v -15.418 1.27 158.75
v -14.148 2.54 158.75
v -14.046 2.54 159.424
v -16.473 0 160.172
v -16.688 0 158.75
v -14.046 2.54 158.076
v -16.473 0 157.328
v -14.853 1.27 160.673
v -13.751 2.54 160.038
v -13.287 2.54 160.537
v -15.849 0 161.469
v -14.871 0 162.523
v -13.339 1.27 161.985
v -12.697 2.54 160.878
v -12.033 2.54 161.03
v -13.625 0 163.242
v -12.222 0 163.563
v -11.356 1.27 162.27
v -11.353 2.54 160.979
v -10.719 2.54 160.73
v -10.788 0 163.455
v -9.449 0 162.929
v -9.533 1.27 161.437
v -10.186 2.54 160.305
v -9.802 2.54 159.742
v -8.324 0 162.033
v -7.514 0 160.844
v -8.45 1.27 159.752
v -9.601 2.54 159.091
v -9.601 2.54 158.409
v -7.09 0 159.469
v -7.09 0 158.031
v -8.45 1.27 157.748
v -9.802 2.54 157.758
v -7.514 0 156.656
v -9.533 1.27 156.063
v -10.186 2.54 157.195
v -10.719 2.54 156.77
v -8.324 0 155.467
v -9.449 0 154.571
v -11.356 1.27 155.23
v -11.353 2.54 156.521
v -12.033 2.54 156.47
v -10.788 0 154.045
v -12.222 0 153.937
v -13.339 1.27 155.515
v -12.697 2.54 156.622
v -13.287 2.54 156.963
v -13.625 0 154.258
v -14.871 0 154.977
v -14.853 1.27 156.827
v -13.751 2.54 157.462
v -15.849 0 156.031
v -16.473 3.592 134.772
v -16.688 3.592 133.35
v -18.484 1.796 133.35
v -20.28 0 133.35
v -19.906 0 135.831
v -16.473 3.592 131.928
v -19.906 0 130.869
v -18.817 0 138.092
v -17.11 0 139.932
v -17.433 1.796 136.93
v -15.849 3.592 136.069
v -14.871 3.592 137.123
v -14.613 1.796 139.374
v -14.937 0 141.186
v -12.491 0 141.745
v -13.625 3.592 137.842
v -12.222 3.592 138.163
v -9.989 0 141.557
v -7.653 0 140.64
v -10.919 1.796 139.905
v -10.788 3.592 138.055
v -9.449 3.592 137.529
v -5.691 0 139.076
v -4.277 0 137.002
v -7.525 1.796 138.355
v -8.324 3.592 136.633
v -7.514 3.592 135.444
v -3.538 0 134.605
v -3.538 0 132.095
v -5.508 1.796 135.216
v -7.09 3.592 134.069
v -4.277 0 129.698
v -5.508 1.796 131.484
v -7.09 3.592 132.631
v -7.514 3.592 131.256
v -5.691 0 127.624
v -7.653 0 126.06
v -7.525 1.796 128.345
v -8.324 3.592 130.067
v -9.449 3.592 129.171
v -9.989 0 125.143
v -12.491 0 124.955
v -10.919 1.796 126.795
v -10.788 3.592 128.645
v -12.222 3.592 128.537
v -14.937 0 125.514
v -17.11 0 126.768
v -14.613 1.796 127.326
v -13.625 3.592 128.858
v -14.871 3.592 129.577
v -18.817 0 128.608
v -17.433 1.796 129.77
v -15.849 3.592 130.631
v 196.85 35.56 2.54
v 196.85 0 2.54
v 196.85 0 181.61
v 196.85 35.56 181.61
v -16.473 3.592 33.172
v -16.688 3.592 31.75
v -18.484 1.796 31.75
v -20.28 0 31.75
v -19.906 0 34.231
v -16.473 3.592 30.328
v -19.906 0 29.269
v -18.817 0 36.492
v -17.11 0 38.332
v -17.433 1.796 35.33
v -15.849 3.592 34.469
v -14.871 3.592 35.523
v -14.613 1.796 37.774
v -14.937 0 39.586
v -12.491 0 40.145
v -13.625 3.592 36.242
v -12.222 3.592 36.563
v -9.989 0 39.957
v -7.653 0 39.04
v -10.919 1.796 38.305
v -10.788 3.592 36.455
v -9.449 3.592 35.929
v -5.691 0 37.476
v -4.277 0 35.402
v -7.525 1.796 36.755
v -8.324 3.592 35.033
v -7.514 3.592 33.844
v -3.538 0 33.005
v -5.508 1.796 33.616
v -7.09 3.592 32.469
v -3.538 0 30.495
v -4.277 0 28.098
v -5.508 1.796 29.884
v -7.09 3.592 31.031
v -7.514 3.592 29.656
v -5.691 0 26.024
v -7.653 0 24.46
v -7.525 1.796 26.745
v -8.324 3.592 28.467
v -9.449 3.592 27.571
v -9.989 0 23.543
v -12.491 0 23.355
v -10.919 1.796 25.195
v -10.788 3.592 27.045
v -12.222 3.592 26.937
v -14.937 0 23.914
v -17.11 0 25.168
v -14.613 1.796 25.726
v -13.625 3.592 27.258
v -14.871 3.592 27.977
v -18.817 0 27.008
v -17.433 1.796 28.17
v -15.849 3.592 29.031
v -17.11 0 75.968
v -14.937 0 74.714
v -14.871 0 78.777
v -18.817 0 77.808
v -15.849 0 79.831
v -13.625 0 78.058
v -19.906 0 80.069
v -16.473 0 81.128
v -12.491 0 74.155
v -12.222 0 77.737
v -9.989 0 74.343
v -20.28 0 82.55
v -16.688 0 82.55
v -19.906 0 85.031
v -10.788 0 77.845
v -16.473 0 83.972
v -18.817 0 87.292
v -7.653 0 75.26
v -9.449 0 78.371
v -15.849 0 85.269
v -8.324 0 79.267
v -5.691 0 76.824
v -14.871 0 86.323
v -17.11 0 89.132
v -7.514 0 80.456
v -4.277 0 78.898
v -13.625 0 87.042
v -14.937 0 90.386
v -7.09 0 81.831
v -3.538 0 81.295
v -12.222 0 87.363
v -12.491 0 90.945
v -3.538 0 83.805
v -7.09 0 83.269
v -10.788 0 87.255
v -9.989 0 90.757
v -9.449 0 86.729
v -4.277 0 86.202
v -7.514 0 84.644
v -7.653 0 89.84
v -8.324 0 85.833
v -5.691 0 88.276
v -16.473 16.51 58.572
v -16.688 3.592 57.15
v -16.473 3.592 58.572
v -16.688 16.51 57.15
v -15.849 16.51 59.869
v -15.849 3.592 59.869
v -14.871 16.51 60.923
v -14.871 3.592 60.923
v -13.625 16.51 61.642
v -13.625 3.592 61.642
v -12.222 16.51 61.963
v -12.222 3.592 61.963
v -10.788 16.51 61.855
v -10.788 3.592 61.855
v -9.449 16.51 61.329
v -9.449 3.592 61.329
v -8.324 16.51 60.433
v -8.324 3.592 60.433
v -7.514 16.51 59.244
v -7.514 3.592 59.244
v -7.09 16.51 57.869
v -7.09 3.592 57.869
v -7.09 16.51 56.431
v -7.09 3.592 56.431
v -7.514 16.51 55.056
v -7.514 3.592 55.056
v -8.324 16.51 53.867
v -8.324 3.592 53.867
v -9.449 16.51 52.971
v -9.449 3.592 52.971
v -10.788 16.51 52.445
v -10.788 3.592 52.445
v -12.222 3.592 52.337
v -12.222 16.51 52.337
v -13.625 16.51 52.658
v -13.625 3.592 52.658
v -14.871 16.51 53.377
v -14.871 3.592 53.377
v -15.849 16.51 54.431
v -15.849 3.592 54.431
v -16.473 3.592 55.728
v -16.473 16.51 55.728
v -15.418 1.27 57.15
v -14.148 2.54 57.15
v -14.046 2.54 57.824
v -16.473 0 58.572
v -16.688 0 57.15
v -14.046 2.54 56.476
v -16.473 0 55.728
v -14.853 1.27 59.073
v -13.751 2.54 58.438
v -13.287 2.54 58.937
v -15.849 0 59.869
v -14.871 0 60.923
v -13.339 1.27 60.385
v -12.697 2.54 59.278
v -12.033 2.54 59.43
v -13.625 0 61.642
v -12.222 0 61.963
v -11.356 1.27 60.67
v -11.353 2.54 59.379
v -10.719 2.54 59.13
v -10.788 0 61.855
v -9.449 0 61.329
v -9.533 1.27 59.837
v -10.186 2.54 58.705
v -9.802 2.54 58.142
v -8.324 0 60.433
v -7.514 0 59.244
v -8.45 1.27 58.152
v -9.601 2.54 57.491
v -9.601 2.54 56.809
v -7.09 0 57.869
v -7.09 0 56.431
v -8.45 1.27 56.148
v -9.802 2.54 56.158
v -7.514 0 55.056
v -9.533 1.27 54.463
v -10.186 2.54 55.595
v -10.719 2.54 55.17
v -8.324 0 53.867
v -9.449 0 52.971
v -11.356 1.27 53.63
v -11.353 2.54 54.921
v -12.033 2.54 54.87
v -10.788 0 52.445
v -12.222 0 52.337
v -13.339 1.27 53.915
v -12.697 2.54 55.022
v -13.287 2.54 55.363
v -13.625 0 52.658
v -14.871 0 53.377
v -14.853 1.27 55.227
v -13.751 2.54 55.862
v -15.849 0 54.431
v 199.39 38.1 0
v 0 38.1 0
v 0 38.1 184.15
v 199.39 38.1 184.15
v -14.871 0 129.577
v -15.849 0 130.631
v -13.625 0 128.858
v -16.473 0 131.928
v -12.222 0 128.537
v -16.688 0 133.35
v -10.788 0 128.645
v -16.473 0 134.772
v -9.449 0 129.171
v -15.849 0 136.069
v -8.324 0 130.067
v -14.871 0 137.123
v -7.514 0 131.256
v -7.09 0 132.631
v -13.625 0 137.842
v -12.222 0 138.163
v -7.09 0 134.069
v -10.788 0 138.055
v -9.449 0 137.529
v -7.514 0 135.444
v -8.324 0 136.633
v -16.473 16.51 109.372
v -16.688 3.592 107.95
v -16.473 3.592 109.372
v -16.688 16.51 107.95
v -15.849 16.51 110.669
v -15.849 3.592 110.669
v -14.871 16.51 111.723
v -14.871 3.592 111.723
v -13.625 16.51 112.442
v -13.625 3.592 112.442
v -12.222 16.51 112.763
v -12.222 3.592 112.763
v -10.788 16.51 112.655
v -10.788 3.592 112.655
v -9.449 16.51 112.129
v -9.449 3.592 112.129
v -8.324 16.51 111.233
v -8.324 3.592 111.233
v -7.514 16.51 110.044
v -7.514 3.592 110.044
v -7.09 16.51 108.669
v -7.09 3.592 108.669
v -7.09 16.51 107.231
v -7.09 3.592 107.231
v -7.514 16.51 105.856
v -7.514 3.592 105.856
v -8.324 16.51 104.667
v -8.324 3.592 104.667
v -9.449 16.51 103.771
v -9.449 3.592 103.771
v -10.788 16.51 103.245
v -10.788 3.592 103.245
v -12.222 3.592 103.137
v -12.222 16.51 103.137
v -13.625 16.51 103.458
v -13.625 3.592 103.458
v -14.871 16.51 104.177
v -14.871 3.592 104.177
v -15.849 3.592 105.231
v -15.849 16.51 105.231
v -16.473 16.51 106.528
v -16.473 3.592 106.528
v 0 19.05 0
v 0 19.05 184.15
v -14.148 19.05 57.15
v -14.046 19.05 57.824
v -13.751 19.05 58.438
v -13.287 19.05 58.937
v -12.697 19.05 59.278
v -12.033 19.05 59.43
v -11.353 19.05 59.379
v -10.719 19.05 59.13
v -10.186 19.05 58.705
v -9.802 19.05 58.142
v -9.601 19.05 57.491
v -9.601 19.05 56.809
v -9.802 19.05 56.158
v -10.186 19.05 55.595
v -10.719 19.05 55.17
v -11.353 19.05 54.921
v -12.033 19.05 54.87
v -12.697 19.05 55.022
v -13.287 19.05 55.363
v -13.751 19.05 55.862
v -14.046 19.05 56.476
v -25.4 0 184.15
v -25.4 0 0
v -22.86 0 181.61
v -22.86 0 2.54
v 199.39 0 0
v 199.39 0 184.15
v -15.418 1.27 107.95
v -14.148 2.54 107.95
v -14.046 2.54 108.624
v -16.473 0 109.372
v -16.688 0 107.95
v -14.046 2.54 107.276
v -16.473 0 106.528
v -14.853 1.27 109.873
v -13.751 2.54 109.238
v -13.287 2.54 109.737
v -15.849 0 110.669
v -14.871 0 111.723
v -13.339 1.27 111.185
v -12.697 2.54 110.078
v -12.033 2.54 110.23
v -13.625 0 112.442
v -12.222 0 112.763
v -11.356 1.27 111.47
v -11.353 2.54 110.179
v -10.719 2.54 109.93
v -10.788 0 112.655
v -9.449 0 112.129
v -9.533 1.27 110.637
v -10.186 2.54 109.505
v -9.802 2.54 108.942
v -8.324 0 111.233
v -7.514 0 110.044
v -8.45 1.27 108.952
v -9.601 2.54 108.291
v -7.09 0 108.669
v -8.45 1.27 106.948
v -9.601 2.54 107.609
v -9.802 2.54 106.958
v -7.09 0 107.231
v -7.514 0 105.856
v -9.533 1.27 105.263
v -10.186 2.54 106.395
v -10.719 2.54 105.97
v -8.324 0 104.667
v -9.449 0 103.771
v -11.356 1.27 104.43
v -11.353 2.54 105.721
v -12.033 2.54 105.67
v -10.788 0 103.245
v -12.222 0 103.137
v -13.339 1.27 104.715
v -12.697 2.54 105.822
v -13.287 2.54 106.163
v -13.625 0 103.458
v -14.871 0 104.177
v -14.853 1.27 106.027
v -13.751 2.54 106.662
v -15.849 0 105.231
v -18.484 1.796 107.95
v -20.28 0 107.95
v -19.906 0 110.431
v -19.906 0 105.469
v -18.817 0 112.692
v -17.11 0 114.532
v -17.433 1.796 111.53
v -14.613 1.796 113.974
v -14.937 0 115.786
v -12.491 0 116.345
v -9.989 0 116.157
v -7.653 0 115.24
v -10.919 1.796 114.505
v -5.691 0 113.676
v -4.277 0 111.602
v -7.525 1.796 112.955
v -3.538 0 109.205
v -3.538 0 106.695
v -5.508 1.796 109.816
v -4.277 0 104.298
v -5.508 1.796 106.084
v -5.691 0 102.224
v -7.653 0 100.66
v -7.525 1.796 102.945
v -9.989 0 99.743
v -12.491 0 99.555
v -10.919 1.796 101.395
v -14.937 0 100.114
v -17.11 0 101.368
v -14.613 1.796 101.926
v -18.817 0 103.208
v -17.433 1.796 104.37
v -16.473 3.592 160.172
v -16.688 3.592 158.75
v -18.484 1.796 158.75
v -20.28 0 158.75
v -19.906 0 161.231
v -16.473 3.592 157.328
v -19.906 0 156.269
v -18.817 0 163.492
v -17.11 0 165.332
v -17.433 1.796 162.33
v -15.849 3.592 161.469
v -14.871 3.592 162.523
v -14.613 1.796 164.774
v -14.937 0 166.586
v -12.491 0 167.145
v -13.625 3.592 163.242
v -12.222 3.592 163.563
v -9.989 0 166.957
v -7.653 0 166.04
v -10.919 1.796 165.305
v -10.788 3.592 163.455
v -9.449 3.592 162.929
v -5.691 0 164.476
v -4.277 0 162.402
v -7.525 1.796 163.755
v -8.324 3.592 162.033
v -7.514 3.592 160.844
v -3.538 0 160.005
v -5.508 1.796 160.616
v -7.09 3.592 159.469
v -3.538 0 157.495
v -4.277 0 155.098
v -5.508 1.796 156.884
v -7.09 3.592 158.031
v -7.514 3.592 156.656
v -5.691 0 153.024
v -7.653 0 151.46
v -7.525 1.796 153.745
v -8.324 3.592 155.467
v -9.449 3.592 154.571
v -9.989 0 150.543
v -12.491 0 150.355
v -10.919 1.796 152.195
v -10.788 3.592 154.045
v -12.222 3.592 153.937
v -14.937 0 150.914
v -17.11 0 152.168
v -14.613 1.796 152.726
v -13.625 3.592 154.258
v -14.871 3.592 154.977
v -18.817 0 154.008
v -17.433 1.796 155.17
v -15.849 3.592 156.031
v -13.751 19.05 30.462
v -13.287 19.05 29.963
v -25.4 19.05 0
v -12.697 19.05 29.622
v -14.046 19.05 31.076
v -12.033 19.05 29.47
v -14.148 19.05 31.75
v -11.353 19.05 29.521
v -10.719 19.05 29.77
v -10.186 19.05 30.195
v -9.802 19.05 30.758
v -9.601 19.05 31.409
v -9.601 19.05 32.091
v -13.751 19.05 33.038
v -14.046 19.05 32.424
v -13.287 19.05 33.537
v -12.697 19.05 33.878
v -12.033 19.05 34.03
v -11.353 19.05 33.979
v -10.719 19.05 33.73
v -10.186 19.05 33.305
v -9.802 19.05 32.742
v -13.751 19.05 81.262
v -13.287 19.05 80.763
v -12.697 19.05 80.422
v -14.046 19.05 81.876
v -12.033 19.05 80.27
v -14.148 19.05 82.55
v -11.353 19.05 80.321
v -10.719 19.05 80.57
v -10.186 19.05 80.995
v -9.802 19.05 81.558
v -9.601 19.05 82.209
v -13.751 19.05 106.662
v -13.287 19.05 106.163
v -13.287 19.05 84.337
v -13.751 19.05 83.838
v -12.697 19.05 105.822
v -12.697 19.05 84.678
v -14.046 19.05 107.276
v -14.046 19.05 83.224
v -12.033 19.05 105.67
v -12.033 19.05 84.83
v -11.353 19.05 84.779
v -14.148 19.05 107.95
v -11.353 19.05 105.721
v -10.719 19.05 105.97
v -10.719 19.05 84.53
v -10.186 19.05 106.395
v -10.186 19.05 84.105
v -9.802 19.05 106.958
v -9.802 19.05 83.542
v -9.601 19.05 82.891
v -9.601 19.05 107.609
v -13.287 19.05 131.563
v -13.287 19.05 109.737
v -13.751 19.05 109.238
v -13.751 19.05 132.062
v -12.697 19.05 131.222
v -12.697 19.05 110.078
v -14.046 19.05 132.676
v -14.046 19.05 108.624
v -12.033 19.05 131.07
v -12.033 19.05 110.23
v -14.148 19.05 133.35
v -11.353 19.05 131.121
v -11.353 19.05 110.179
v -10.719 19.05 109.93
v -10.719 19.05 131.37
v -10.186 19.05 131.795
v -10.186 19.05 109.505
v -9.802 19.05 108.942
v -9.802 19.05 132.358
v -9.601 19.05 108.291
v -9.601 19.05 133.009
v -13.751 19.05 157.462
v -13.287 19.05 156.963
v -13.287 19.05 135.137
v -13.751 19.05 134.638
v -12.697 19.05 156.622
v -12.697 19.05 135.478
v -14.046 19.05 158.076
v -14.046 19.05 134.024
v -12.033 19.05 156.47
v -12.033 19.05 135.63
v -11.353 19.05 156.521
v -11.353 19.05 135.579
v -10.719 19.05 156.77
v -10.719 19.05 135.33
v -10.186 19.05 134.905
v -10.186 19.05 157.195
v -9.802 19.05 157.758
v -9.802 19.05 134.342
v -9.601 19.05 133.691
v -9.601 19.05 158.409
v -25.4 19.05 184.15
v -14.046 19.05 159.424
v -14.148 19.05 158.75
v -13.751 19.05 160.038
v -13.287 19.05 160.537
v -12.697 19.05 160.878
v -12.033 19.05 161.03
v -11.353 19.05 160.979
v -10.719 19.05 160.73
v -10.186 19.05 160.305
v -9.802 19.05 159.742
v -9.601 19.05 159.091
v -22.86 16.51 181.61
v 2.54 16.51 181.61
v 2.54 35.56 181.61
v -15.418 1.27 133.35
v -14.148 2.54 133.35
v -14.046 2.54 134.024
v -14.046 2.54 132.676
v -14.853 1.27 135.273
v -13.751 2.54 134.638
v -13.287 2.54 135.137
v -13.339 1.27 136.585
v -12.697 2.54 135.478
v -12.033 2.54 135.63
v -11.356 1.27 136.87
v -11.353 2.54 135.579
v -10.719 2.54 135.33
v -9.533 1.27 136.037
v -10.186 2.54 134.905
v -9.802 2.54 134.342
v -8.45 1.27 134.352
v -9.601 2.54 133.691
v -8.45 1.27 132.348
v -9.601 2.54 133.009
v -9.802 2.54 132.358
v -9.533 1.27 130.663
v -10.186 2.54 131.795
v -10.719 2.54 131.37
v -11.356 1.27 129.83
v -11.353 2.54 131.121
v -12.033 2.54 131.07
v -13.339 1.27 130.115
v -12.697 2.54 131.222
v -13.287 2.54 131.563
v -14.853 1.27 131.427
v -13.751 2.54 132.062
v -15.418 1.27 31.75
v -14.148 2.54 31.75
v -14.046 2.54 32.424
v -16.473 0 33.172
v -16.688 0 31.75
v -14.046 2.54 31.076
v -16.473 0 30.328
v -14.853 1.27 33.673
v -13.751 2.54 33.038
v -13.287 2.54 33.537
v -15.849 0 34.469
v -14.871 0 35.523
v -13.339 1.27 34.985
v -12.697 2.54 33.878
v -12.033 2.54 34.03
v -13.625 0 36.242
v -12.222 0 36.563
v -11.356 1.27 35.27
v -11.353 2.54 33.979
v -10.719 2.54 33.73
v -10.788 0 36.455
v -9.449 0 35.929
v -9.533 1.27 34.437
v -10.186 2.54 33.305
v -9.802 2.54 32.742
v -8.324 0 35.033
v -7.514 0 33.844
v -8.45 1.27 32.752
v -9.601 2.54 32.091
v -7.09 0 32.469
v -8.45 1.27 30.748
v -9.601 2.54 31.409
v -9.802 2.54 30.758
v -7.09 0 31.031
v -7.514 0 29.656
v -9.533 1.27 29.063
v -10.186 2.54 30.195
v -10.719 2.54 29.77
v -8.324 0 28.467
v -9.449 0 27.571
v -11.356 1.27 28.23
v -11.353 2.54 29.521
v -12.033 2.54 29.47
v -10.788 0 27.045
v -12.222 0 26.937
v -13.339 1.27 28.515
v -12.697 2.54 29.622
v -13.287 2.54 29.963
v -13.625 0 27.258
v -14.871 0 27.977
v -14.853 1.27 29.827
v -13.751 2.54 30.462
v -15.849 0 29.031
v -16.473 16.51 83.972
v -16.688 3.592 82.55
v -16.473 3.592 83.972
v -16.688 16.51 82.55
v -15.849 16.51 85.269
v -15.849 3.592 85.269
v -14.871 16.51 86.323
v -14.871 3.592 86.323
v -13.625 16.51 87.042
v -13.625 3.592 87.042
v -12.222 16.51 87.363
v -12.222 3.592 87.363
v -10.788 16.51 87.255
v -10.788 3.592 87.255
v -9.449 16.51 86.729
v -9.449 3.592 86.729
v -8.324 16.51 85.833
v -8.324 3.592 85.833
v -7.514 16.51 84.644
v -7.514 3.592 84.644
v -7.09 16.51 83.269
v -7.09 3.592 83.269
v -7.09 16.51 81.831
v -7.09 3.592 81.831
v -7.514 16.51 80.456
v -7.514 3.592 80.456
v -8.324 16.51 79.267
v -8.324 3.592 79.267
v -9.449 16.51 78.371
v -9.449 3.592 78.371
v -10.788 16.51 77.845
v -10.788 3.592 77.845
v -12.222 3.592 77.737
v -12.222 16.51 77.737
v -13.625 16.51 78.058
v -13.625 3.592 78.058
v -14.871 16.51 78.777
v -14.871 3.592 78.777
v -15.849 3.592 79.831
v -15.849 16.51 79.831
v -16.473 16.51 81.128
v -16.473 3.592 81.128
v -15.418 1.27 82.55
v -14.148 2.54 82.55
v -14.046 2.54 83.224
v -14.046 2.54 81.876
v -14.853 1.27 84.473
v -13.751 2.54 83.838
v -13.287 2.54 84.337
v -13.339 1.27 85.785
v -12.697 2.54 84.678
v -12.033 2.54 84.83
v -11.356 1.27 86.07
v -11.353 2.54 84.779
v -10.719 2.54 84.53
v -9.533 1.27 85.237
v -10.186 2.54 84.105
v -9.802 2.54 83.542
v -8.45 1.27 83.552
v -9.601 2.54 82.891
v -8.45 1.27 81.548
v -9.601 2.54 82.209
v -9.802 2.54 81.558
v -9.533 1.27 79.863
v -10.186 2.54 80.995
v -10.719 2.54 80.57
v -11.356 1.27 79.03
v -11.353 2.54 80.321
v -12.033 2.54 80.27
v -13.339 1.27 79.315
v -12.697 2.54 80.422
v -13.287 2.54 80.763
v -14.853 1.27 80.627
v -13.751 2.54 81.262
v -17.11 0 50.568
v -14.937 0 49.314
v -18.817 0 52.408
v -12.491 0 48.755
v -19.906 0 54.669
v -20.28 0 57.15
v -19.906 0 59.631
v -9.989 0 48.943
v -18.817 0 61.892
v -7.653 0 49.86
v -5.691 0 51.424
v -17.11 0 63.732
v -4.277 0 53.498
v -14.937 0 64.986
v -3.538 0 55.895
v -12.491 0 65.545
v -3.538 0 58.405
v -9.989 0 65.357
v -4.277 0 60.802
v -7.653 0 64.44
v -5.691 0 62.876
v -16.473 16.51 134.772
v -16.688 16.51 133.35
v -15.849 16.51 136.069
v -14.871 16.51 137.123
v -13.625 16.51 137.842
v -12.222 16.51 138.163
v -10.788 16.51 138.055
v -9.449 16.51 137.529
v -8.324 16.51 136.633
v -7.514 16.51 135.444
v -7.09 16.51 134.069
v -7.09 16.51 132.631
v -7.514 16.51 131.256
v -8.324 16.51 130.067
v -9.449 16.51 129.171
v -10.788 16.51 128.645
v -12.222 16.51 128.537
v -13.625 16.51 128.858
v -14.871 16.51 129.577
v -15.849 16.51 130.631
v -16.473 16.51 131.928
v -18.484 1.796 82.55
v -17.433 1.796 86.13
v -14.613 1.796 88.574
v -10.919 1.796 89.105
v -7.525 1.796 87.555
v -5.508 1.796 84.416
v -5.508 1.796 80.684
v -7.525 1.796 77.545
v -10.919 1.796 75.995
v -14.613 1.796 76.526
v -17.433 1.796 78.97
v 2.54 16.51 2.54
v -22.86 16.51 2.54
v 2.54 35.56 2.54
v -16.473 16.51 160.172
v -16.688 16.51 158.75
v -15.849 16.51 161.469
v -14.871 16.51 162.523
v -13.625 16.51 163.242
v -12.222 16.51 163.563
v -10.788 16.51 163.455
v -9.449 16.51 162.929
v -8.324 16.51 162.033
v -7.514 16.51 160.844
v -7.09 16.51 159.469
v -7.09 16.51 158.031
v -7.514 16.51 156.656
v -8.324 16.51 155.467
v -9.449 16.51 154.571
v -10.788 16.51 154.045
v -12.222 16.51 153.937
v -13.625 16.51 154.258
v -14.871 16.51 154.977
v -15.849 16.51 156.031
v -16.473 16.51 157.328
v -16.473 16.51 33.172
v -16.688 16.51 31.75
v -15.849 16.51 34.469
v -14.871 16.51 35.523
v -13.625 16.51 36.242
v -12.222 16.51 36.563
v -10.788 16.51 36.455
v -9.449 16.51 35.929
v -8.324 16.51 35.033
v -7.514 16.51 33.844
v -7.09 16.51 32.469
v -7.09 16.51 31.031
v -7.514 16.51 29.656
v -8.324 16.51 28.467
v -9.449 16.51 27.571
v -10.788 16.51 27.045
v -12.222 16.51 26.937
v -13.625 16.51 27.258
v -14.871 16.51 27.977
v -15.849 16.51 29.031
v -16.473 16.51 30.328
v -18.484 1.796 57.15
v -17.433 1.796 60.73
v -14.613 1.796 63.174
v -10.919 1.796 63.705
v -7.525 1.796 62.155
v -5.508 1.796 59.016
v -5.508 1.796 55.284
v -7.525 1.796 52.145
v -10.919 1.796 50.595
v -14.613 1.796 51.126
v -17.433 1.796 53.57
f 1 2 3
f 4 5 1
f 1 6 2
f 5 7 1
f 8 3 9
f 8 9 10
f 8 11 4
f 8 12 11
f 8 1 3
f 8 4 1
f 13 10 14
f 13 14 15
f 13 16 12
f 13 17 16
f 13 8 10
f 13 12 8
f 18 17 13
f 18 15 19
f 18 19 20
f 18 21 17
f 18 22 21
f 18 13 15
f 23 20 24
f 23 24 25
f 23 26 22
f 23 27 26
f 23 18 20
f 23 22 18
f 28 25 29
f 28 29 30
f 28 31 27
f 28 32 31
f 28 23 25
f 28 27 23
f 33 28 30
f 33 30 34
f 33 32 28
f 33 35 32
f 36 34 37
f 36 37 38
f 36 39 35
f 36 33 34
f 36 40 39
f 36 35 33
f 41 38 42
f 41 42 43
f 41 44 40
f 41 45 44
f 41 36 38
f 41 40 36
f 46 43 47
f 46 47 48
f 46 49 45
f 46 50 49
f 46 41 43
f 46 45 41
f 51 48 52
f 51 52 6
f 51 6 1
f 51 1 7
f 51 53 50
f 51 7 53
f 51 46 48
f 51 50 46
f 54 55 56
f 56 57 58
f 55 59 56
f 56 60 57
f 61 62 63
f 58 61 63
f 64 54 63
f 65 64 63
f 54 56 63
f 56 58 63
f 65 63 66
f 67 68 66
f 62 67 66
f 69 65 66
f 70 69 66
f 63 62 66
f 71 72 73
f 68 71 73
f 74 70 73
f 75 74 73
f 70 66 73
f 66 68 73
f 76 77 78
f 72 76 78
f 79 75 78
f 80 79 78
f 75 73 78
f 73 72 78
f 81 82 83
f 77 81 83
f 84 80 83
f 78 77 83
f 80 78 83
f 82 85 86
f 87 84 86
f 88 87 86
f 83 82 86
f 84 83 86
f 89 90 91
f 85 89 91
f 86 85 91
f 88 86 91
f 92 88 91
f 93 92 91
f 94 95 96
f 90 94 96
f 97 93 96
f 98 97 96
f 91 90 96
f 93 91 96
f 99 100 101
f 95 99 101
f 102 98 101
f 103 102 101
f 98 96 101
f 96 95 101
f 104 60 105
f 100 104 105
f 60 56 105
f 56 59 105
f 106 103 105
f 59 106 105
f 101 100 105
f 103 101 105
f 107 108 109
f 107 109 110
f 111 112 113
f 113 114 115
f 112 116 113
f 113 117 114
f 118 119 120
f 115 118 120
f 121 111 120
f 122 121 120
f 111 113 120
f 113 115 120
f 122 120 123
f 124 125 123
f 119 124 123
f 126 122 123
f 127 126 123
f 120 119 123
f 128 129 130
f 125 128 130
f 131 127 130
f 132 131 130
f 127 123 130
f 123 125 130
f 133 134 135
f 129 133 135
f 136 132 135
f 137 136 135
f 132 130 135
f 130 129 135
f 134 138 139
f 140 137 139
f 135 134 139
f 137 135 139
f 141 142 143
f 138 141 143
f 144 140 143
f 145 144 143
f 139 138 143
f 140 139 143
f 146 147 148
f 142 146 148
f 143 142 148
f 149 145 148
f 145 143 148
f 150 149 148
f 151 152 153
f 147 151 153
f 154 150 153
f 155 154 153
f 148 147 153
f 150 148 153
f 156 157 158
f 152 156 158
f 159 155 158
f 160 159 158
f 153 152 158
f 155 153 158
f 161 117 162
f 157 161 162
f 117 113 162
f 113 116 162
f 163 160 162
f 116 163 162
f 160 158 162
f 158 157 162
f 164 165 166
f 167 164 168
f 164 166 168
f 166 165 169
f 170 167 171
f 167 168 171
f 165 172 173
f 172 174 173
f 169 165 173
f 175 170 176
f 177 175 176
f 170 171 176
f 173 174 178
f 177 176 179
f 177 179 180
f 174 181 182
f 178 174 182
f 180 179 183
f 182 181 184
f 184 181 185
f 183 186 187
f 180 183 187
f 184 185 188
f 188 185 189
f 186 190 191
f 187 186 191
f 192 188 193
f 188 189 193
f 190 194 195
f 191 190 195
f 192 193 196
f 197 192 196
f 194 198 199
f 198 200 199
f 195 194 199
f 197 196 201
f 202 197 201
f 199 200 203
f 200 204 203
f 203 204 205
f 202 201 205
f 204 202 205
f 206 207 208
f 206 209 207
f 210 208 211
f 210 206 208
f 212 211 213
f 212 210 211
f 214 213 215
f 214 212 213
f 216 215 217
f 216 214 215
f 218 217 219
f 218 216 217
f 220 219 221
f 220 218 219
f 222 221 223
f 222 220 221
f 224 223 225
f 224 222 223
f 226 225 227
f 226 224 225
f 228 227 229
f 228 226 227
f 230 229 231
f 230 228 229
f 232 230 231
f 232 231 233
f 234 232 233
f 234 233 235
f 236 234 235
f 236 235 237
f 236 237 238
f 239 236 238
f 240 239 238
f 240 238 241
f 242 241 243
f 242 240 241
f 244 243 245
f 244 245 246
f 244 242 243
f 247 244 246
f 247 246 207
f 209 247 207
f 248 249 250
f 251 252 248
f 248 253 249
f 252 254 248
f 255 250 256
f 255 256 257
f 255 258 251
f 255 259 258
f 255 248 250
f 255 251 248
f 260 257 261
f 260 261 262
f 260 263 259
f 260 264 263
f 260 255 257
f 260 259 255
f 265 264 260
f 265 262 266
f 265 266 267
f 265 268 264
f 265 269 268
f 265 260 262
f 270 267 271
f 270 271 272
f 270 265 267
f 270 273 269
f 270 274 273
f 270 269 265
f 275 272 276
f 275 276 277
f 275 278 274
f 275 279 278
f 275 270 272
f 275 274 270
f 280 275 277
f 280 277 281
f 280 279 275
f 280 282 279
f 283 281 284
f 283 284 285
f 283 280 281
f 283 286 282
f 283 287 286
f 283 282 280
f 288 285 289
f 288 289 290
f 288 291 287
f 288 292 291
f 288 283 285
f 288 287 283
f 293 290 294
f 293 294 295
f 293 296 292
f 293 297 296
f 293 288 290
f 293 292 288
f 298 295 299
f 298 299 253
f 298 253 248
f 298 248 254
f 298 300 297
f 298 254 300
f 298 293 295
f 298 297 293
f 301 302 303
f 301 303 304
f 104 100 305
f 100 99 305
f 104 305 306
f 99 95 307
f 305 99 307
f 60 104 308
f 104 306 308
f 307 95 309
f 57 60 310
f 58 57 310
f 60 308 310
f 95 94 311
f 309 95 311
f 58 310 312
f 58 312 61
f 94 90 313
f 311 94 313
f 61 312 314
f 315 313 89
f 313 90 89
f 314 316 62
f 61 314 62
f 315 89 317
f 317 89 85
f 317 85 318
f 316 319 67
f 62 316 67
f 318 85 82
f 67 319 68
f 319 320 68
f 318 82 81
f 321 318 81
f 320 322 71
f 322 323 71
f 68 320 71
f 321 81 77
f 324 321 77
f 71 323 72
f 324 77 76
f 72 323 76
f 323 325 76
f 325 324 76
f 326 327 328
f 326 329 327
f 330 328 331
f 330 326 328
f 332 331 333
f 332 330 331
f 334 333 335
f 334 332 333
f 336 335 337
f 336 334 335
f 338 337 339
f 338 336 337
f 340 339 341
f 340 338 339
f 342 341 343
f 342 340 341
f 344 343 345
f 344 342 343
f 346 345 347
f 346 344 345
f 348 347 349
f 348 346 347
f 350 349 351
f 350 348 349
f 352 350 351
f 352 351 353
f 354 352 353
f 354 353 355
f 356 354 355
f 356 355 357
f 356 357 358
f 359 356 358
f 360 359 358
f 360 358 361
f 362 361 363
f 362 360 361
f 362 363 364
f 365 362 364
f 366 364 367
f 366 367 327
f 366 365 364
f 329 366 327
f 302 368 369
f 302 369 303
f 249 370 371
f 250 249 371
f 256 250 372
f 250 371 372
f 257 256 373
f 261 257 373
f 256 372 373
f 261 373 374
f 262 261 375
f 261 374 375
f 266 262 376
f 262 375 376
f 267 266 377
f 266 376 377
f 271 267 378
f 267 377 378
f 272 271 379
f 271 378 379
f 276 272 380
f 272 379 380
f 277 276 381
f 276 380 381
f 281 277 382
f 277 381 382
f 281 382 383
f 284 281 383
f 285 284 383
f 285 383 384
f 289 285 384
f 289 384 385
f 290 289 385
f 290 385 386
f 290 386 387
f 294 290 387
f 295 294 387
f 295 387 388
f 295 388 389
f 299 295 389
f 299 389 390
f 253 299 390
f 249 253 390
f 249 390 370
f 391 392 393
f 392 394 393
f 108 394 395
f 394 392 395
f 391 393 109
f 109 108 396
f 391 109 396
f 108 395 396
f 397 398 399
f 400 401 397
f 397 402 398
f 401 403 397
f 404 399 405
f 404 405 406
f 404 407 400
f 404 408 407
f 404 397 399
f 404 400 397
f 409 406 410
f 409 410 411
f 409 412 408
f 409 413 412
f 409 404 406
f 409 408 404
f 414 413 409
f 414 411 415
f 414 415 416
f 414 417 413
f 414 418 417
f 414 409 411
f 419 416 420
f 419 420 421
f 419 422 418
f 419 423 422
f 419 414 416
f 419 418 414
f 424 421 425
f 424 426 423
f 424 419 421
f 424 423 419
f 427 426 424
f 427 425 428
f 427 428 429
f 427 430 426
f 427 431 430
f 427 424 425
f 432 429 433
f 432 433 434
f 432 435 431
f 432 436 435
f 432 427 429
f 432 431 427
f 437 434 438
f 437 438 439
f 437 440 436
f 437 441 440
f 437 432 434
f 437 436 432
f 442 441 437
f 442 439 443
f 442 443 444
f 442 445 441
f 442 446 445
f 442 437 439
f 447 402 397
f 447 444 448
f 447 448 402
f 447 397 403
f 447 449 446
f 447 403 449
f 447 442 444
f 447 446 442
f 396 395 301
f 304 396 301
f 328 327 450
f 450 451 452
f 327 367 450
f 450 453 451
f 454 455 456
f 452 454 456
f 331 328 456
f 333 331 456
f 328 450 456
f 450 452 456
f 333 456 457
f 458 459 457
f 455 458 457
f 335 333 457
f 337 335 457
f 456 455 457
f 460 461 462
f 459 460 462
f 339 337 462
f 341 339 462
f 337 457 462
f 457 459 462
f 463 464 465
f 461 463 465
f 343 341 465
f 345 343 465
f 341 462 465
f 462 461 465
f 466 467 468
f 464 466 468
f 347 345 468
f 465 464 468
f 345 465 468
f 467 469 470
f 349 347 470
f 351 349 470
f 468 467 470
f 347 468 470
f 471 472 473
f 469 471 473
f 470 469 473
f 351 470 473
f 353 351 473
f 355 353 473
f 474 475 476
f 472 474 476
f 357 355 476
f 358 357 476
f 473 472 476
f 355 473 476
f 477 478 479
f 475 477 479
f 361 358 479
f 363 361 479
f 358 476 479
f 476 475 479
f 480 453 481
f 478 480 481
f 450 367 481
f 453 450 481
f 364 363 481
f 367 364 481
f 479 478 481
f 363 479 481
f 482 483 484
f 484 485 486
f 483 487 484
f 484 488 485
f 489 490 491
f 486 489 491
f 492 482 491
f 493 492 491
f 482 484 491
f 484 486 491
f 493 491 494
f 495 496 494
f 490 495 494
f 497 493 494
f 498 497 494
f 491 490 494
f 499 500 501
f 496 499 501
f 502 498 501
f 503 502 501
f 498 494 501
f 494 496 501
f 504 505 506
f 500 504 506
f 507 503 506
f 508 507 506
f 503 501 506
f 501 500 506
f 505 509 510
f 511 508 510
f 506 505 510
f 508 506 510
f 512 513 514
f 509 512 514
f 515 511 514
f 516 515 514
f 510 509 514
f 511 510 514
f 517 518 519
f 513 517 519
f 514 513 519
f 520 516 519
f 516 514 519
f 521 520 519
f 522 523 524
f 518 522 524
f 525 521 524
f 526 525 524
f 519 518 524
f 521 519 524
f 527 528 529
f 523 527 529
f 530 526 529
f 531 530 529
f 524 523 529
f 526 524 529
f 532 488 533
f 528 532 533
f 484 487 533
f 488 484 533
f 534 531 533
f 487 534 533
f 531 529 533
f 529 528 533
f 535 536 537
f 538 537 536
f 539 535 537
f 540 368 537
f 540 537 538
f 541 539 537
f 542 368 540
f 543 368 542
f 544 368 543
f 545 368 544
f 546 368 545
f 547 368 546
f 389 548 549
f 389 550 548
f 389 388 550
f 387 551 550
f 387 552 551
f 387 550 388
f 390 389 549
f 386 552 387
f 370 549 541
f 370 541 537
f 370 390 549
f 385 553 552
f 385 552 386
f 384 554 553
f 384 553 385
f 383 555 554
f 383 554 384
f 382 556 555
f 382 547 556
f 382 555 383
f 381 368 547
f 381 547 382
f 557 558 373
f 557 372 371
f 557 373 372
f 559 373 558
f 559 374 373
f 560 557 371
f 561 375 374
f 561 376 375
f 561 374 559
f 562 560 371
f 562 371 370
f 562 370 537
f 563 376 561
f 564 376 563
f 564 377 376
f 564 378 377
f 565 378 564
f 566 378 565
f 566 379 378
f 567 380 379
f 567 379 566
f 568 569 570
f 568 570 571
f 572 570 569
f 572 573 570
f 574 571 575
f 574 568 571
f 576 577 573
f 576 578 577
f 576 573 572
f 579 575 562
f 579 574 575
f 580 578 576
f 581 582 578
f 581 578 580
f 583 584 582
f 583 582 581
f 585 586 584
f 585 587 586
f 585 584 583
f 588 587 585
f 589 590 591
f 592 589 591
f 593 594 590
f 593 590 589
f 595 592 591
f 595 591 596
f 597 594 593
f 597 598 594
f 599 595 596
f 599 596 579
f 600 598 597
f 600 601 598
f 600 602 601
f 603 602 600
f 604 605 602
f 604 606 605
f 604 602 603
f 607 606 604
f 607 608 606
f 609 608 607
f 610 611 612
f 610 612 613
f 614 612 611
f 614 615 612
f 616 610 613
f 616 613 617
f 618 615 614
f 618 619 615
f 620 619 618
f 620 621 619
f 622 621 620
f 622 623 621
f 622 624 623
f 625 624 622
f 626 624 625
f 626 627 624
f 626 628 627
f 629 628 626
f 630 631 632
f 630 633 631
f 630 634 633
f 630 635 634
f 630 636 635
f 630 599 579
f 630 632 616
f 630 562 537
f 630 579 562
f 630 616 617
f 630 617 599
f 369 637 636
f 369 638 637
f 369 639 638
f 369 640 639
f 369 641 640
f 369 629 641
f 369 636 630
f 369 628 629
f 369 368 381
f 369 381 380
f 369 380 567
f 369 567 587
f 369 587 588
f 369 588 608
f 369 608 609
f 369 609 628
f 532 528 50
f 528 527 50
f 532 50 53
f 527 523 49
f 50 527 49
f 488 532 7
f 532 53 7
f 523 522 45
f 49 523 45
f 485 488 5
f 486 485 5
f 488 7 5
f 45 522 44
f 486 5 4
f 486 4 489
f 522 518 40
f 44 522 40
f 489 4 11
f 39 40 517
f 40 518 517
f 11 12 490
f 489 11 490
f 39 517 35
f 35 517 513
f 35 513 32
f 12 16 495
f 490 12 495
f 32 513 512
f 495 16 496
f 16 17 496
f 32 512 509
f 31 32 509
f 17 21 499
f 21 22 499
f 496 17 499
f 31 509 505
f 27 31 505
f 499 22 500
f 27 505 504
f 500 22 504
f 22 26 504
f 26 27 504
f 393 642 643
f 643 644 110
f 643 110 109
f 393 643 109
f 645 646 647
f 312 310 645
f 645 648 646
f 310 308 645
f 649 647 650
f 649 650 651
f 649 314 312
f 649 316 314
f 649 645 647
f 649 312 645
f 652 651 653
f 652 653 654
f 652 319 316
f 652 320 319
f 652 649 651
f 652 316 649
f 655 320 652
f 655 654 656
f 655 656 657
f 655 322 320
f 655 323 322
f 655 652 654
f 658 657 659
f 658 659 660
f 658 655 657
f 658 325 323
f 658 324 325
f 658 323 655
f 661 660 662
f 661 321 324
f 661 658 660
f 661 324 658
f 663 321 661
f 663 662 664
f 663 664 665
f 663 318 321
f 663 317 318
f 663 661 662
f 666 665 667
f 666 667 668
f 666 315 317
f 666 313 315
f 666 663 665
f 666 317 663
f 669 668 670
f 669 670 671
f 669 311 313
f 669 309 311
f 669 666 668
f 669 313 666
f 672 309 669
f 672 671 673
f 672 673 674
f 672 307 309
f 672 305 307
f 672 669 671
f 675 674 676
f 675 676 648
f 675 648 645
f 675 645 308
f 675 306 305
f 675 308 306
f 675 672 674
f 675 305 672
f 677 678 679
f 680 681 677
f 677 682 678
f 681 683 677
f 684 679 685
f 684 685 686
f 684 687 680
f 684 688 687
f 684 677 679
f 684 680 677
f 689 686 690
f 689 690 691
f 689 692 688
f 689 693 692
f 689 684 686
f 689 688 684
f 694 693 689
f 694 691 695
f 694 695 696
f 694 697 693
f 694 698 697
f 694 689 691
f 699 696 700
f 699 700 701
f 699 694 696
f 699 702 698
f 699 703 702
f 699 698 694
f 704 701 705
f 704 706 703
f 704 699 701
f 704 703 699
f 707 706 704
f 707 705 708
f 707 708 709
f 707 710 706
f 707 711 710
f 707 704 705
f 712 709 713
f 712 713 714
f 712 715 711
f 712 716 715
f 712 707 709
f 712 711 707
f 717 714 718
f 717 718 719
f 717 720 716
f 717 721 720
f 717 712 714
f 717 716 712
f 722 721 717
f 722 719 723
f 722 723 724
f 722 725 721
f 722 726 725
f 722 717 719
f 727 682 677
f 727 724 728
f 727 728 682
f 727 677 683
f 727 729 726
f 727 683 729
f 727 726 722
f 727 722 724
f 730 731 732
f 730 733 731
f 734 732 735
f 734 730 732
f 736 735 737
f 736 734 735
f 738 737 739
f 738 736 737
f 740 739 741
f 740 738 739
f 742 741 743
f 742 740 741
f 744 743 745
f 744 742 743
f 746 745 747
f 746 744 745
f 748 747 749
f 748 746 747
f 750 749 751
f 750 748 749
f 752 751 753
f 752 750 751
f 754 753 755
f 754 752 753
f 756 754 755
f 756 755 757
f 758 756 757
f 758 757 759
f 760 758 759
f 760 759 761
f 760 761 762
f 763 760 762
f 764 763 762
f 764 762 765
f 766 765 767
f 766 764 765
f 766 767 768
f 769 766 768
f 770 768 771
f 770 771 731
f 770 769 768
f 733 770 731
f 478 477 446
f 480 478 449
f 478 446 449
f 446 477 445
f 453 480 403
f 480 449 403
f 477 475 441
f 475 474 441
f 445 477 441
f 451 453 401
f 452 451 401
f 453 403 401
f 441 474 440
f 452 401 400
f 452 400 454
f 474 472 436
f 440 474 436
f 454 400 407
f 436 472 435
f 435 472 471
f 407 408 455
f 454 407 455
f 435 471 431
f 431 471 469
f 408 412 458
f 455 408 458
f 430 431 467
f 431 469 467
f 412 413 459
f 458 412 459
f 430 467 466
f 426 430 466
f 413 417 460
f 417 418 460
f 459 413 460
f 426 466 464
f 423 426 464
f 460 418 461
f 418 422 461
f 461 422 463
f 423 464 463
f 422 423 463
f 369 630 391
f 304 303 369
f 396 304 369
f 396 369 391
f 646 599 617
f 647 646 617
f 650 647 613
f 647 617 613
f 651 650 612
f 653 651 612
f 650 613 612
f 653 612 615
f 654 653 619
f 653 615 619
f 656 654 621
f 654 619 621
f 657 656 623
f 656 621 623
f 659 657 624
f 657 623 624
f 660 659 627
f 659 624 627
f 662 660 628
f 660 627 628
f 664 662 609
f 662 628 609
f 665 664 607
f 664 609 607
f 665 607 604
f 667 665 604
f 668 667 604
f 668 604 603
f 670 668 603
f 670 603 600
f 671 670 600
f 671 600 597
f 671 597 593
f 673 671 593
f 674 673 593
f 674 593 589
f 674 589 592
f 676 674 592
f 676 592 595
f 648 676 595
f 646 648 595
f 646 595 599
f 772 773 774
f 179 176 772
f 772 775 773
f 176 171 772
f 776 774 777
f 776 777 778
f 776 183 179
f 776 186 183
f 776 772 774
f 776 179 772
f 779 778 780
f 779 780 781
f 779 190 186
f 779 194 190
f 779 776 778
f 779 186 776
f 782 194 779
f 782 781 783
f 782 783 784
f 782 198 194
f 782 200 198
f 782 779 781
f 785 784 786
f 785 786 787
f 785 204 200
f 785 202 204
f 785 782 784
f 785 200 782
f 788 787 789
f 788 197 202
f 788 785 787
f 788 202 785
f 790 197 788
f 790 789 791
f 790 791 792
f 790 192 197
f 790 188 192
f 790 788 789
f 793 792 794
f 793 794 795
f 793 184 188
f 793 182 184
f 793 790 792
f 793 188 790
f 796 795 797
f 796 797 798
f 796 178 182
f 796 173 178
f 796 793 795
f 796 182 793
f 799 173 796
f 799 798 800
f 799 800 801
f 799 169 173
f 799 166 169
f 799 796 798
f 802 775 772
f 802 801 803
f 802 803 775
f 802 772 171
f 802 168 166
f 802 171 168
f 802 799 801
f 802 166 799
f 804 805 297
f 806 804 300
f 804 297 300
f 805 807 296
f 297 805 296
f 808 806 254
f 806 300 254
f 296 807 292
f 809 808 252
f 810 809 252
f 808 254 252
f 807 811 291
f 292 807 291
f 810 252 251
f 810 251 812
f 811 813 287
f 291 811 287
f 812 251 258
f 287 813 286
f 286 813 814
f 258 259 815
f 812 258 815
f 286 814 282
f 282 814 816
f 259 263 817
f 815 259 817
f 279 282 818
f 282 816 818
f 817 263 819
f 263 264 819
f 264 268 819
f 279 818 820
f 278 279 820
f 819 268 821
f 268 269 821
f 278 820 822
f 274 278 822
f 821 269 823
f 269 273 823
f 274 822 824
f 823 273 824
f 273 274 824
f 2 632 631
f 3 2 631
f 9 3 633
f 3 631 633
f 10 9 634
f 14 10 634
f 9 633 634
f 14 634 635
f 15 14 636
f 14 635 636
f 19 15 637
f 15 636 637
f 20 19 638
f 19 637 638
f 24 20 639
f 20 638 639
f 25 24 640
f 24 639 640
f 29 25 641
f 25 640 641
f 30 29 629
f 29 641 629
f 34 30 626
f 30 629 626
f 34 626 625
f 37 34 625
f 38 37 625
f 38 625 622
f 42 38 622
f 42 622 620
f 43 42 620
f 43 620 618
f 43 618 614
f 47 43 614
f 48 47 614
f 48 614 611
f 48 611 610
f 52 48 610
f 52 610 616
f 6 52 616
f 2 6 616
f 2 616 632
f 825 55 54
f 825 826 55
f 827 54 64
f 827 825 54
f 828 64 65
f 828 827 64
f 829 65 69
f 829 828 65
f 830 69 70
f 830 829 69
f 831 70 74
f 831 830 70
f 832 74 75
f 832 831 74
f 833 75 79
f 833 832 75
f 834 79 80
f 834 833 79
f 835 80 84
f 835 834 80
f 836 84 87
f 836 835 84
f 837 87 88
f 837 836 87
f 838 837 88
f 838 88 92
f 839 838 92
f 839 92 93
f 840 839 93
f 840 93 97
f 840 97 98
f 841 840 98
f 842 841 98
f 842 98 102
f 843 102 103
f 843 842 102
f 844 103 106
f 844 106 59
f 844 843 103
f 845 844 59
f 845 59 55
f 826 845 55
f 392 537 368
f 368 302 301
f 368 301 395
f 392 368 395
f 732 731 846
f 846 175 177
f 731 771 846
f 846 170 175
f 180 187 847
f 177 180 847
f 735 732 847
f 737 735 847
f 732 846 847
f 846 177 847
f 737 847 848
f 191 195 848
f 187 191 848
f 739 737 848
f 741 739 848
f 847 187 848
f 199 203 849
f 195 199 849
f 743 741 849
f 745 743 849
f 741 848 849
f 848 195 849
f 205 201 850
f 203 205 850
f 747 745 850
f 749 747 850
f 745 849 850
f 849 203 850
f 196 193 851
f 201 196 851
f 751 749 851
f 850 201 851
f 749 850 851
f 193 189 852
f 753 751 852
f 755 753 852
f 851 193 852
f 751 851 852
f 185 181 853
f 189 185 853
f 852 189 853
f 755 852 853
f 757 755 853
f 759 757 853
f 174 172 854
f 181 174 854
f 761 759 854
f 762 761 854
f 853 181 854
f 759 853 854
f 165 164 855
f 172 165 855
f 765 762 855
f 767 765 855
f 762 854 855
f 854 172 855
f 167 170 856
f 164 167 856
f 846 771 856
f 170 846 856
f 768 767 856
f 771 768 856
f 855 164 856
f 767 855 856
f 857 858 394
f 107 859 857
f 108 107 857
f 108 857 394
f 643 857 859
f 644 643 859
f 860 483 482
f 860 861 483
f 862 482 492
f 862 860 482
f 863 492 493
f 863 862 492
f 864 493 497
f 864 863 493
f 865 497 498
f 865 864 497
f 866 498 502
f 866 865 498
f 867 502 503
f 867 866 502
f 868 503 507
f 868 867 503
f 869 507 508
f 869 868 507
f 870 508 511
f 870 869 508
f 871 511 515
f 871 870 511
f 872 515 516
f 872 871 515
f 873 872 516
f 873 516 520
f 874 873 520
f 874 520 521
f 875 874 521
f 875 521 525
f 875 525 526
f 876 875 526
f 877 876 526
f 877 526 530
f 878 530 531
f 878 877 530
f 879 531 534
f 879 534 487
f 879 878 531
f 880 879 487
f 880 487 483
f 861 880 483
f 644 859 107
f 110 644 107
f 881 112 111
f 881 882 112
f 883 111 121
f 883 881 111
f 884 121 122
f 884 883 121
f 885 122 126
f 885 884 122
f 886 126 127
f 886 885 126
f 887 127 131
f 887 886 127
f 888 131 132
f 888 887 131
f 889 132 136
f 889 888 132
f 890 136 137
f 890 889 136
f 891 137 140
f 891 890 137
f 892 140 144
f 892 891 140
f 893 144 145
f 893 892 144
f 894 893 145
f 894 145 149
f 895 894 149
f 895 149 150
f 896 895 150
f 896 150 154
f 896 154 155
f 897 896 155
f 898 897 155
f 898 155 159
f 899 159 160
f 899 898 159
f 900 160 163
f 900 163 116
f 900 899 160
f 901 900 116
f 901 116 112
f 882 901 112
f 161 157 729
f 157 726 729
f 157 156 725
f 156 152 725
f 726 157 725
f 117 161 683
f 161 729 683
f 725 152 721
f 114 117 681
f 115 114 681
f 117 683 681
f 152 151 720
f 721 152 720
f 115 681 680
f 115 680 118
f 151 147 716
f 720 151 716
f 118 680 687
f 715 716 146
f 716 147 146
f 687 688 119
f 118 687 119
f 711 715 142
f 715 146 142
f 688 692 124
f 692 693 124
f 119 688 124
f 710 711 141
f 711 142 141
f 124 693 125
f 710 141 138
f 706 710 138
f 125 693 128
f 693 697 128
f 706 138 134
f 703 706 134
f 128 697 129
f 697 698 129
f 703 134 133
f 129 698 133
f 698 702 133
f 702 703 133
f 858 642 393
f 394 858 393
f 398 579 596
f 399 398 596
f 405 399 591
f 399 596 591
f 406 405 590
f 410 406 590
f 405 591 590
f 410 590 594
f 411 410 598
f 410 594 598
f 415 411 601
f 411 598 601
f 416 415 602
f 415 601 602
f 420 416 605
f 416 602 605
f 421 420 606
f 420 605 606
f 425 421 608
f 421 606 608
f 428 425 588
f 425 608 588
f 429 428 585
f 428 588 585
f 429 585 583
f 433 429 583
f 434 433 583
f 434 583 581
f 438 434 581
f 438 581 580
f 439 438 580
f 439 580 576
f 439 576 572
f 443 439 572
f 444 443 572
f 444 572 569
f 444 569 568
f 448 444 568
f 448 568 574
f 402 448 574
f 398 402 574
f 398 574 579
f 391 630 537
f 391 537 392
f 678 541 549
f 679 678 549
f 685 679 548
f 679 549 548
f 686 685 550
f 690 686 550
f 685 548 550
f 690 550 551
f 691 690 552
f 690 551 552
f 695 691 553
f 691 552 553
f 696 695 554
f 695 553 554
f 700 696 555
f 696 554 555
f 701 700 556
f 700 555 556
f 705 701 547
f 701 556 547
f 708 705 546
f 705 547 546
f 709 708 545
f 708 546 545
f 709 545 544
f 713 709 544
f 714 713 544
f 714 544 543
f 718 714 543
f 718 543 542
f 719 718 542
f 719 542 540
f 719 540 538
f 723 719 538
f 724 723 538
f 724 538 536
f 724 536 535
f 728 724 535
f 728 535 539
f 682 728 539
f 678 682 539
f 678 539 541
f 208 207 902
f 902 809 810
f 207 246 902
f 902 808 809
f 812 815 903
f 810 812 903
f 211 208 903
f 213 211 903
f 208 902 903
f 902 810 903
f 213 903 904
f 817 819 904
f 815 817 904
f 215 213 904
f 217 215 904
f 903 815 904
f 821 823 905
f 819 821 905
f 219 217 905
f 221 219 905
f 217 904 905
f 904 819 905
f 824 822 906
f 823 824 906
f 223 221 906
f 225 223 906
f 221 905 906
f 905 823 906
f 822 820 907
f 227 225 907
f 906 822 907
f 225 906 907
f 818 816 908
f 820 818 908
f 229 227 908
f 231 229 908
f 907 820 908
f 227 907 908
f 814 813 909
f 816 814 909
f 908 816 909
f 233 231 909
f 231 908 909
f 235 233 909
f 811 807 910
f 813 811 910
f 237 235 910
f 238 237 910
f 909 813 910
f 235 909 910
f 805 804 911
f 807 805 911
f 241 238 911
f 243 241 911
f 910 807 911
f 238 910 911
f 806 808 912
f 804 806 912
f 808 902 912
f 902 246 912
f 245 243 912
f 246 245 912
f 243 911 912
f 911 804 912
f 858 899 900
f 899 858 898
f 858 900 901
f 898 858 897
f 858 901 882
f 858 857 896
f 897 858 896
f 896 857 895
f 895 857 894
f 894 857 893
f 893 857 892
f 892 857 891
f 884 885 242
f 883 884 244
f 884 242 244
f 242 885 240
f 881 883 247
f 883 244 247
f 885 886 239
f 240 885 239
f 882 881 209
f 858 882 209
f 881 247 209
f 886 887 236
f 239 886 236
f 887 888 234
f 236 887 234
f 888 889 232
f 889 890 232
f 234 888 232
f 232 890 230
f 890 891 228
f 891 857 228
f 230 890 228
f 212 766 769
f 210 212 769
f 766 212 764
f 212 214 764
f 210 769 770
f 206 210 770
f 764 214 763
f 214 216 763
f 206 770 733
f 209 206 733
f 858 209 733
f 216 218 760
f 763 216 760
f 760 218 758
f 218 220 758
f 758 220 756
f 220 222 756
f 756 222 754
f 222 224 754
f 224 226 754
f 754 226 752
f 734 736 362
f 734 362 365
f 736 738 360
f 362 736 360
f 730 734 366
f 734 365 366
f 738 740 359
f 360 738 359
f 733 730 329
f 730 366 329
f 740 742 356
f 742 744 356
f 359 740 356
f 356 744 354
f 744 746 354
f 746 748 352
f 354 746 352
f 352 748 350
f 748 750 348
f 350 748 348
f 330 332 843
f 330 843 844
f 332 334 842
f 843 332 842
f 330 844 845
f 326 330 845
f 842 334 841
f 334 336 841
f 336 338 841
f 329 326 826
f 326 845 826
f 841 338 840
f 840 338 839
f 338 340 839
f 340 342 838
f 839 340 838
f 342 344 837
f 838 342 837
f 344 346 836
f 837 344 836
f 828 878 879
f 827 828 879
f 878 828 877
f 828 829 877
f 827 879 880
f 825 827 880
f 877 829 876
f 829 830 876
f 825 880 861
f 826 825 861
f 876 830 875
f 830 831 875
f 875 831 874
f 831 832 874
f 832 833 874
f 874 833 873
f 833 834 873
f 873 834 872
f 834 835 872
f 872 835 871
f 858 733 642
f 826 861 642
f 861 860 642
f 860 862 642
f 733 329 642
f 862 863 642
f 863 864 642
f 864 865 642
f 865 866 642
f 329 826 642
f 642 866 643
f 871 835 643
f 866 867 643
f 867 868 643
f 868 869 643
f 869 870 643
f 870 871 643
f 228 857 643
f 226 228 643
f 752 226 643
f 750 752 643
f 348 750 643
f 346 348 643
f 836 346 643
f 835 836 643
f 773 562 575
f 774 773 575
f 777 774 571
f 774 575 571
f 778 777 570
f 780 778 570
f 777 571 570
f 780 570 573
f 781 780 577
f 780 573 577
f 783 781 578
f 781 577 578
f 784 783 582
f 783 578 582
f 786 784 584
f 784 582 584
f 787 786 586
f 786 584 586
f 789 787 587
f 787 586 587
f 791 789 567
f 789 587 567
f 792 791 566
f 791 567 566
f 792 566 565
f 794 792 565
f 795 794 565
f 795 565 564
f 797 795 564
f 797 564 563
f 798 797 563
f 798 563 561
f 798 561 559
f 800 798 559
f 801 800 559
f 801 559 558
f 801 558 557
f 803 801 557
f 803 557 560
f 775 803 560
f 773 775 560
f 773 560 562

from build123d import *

# Parameters (mm, degrees)
F0_W     = 199.39
F0_H     = 38.1
F1_DEPTH = 184.15
F2_W     = 19.05
F2_H     = 184.15
F3_DEPTH = 25.4
F4_R     = 2.286
F5_DEPTH = 25.4
F6_SIZE  = 2.54
F7_T     = -2.54


with BuildPart() as f1:
    # F0 (on Top) → F1 (new body)
    with BuildSketch(Plane.XY):
        with Locations((99.695, 19.05)):
            Rectangle(F0_W, F0_H)
    extrude(amount=F1_DEPTH)

    # F2 (on face) → F3 (join)
    with BuildSketch(Plane(origin=(0, 0, 0), x_dir=(0, -1, 0), z_dir=(-1, 0, 0))):
        with Locations((-9.525, 92.075)):
            Rectangle(F2_W, F2_H)
    extrude(amount=F3_DEPTH)

    # F4 (on face) → F5 (cut)
    with BuildSketch(Plane(origin=(0, 19.05, 0), x_dir=(-1, 0, 0), z_dir=(0, 1, 0))):
        with Locations((11.8618, 158.75)):
            Circle(F4_R)
        with Locations((11.8618, 133.35)):
            Circle(F4_R)
        with Locations((11.8618, 107.95)):
            Circle(F4_R)
        with Locations((11.8618, 82.55)):
            Circle(F4_R)
        with Locations((11.8618, 57.15)):
            Circle(F4_R)
        with Locations((11.8618, 31.75)):
            Circle(F4_R)
    extrude(amount=-F5_DEPTH, mode=Mode.SUBTRACT)

    # F6
    f6_edges = [f1.edges().sort_by_distance(p)[0] for p in [
        (-9.5758, 0, 158.75),
        (-9.5758, 0, 133.35),
        (-9.5758, 0, 107.95),
        (-9.5758, 0, 82.55),
        (-9.5758, 0, 57.15),
        (-9.5758, 0, 31.75),
    ]]
    chamfer(f6_edges, length=F6_SIZE)

    # F7
    f7_openings = [f1.faces().sort_by_distance(p)[0] for p in [
        (88.054654, 0, 92.040967),
    ]]
    offset(amount=F7_T, openings=f7_openings, kind=Kind.INTERSECTION)


solid = f1.part
